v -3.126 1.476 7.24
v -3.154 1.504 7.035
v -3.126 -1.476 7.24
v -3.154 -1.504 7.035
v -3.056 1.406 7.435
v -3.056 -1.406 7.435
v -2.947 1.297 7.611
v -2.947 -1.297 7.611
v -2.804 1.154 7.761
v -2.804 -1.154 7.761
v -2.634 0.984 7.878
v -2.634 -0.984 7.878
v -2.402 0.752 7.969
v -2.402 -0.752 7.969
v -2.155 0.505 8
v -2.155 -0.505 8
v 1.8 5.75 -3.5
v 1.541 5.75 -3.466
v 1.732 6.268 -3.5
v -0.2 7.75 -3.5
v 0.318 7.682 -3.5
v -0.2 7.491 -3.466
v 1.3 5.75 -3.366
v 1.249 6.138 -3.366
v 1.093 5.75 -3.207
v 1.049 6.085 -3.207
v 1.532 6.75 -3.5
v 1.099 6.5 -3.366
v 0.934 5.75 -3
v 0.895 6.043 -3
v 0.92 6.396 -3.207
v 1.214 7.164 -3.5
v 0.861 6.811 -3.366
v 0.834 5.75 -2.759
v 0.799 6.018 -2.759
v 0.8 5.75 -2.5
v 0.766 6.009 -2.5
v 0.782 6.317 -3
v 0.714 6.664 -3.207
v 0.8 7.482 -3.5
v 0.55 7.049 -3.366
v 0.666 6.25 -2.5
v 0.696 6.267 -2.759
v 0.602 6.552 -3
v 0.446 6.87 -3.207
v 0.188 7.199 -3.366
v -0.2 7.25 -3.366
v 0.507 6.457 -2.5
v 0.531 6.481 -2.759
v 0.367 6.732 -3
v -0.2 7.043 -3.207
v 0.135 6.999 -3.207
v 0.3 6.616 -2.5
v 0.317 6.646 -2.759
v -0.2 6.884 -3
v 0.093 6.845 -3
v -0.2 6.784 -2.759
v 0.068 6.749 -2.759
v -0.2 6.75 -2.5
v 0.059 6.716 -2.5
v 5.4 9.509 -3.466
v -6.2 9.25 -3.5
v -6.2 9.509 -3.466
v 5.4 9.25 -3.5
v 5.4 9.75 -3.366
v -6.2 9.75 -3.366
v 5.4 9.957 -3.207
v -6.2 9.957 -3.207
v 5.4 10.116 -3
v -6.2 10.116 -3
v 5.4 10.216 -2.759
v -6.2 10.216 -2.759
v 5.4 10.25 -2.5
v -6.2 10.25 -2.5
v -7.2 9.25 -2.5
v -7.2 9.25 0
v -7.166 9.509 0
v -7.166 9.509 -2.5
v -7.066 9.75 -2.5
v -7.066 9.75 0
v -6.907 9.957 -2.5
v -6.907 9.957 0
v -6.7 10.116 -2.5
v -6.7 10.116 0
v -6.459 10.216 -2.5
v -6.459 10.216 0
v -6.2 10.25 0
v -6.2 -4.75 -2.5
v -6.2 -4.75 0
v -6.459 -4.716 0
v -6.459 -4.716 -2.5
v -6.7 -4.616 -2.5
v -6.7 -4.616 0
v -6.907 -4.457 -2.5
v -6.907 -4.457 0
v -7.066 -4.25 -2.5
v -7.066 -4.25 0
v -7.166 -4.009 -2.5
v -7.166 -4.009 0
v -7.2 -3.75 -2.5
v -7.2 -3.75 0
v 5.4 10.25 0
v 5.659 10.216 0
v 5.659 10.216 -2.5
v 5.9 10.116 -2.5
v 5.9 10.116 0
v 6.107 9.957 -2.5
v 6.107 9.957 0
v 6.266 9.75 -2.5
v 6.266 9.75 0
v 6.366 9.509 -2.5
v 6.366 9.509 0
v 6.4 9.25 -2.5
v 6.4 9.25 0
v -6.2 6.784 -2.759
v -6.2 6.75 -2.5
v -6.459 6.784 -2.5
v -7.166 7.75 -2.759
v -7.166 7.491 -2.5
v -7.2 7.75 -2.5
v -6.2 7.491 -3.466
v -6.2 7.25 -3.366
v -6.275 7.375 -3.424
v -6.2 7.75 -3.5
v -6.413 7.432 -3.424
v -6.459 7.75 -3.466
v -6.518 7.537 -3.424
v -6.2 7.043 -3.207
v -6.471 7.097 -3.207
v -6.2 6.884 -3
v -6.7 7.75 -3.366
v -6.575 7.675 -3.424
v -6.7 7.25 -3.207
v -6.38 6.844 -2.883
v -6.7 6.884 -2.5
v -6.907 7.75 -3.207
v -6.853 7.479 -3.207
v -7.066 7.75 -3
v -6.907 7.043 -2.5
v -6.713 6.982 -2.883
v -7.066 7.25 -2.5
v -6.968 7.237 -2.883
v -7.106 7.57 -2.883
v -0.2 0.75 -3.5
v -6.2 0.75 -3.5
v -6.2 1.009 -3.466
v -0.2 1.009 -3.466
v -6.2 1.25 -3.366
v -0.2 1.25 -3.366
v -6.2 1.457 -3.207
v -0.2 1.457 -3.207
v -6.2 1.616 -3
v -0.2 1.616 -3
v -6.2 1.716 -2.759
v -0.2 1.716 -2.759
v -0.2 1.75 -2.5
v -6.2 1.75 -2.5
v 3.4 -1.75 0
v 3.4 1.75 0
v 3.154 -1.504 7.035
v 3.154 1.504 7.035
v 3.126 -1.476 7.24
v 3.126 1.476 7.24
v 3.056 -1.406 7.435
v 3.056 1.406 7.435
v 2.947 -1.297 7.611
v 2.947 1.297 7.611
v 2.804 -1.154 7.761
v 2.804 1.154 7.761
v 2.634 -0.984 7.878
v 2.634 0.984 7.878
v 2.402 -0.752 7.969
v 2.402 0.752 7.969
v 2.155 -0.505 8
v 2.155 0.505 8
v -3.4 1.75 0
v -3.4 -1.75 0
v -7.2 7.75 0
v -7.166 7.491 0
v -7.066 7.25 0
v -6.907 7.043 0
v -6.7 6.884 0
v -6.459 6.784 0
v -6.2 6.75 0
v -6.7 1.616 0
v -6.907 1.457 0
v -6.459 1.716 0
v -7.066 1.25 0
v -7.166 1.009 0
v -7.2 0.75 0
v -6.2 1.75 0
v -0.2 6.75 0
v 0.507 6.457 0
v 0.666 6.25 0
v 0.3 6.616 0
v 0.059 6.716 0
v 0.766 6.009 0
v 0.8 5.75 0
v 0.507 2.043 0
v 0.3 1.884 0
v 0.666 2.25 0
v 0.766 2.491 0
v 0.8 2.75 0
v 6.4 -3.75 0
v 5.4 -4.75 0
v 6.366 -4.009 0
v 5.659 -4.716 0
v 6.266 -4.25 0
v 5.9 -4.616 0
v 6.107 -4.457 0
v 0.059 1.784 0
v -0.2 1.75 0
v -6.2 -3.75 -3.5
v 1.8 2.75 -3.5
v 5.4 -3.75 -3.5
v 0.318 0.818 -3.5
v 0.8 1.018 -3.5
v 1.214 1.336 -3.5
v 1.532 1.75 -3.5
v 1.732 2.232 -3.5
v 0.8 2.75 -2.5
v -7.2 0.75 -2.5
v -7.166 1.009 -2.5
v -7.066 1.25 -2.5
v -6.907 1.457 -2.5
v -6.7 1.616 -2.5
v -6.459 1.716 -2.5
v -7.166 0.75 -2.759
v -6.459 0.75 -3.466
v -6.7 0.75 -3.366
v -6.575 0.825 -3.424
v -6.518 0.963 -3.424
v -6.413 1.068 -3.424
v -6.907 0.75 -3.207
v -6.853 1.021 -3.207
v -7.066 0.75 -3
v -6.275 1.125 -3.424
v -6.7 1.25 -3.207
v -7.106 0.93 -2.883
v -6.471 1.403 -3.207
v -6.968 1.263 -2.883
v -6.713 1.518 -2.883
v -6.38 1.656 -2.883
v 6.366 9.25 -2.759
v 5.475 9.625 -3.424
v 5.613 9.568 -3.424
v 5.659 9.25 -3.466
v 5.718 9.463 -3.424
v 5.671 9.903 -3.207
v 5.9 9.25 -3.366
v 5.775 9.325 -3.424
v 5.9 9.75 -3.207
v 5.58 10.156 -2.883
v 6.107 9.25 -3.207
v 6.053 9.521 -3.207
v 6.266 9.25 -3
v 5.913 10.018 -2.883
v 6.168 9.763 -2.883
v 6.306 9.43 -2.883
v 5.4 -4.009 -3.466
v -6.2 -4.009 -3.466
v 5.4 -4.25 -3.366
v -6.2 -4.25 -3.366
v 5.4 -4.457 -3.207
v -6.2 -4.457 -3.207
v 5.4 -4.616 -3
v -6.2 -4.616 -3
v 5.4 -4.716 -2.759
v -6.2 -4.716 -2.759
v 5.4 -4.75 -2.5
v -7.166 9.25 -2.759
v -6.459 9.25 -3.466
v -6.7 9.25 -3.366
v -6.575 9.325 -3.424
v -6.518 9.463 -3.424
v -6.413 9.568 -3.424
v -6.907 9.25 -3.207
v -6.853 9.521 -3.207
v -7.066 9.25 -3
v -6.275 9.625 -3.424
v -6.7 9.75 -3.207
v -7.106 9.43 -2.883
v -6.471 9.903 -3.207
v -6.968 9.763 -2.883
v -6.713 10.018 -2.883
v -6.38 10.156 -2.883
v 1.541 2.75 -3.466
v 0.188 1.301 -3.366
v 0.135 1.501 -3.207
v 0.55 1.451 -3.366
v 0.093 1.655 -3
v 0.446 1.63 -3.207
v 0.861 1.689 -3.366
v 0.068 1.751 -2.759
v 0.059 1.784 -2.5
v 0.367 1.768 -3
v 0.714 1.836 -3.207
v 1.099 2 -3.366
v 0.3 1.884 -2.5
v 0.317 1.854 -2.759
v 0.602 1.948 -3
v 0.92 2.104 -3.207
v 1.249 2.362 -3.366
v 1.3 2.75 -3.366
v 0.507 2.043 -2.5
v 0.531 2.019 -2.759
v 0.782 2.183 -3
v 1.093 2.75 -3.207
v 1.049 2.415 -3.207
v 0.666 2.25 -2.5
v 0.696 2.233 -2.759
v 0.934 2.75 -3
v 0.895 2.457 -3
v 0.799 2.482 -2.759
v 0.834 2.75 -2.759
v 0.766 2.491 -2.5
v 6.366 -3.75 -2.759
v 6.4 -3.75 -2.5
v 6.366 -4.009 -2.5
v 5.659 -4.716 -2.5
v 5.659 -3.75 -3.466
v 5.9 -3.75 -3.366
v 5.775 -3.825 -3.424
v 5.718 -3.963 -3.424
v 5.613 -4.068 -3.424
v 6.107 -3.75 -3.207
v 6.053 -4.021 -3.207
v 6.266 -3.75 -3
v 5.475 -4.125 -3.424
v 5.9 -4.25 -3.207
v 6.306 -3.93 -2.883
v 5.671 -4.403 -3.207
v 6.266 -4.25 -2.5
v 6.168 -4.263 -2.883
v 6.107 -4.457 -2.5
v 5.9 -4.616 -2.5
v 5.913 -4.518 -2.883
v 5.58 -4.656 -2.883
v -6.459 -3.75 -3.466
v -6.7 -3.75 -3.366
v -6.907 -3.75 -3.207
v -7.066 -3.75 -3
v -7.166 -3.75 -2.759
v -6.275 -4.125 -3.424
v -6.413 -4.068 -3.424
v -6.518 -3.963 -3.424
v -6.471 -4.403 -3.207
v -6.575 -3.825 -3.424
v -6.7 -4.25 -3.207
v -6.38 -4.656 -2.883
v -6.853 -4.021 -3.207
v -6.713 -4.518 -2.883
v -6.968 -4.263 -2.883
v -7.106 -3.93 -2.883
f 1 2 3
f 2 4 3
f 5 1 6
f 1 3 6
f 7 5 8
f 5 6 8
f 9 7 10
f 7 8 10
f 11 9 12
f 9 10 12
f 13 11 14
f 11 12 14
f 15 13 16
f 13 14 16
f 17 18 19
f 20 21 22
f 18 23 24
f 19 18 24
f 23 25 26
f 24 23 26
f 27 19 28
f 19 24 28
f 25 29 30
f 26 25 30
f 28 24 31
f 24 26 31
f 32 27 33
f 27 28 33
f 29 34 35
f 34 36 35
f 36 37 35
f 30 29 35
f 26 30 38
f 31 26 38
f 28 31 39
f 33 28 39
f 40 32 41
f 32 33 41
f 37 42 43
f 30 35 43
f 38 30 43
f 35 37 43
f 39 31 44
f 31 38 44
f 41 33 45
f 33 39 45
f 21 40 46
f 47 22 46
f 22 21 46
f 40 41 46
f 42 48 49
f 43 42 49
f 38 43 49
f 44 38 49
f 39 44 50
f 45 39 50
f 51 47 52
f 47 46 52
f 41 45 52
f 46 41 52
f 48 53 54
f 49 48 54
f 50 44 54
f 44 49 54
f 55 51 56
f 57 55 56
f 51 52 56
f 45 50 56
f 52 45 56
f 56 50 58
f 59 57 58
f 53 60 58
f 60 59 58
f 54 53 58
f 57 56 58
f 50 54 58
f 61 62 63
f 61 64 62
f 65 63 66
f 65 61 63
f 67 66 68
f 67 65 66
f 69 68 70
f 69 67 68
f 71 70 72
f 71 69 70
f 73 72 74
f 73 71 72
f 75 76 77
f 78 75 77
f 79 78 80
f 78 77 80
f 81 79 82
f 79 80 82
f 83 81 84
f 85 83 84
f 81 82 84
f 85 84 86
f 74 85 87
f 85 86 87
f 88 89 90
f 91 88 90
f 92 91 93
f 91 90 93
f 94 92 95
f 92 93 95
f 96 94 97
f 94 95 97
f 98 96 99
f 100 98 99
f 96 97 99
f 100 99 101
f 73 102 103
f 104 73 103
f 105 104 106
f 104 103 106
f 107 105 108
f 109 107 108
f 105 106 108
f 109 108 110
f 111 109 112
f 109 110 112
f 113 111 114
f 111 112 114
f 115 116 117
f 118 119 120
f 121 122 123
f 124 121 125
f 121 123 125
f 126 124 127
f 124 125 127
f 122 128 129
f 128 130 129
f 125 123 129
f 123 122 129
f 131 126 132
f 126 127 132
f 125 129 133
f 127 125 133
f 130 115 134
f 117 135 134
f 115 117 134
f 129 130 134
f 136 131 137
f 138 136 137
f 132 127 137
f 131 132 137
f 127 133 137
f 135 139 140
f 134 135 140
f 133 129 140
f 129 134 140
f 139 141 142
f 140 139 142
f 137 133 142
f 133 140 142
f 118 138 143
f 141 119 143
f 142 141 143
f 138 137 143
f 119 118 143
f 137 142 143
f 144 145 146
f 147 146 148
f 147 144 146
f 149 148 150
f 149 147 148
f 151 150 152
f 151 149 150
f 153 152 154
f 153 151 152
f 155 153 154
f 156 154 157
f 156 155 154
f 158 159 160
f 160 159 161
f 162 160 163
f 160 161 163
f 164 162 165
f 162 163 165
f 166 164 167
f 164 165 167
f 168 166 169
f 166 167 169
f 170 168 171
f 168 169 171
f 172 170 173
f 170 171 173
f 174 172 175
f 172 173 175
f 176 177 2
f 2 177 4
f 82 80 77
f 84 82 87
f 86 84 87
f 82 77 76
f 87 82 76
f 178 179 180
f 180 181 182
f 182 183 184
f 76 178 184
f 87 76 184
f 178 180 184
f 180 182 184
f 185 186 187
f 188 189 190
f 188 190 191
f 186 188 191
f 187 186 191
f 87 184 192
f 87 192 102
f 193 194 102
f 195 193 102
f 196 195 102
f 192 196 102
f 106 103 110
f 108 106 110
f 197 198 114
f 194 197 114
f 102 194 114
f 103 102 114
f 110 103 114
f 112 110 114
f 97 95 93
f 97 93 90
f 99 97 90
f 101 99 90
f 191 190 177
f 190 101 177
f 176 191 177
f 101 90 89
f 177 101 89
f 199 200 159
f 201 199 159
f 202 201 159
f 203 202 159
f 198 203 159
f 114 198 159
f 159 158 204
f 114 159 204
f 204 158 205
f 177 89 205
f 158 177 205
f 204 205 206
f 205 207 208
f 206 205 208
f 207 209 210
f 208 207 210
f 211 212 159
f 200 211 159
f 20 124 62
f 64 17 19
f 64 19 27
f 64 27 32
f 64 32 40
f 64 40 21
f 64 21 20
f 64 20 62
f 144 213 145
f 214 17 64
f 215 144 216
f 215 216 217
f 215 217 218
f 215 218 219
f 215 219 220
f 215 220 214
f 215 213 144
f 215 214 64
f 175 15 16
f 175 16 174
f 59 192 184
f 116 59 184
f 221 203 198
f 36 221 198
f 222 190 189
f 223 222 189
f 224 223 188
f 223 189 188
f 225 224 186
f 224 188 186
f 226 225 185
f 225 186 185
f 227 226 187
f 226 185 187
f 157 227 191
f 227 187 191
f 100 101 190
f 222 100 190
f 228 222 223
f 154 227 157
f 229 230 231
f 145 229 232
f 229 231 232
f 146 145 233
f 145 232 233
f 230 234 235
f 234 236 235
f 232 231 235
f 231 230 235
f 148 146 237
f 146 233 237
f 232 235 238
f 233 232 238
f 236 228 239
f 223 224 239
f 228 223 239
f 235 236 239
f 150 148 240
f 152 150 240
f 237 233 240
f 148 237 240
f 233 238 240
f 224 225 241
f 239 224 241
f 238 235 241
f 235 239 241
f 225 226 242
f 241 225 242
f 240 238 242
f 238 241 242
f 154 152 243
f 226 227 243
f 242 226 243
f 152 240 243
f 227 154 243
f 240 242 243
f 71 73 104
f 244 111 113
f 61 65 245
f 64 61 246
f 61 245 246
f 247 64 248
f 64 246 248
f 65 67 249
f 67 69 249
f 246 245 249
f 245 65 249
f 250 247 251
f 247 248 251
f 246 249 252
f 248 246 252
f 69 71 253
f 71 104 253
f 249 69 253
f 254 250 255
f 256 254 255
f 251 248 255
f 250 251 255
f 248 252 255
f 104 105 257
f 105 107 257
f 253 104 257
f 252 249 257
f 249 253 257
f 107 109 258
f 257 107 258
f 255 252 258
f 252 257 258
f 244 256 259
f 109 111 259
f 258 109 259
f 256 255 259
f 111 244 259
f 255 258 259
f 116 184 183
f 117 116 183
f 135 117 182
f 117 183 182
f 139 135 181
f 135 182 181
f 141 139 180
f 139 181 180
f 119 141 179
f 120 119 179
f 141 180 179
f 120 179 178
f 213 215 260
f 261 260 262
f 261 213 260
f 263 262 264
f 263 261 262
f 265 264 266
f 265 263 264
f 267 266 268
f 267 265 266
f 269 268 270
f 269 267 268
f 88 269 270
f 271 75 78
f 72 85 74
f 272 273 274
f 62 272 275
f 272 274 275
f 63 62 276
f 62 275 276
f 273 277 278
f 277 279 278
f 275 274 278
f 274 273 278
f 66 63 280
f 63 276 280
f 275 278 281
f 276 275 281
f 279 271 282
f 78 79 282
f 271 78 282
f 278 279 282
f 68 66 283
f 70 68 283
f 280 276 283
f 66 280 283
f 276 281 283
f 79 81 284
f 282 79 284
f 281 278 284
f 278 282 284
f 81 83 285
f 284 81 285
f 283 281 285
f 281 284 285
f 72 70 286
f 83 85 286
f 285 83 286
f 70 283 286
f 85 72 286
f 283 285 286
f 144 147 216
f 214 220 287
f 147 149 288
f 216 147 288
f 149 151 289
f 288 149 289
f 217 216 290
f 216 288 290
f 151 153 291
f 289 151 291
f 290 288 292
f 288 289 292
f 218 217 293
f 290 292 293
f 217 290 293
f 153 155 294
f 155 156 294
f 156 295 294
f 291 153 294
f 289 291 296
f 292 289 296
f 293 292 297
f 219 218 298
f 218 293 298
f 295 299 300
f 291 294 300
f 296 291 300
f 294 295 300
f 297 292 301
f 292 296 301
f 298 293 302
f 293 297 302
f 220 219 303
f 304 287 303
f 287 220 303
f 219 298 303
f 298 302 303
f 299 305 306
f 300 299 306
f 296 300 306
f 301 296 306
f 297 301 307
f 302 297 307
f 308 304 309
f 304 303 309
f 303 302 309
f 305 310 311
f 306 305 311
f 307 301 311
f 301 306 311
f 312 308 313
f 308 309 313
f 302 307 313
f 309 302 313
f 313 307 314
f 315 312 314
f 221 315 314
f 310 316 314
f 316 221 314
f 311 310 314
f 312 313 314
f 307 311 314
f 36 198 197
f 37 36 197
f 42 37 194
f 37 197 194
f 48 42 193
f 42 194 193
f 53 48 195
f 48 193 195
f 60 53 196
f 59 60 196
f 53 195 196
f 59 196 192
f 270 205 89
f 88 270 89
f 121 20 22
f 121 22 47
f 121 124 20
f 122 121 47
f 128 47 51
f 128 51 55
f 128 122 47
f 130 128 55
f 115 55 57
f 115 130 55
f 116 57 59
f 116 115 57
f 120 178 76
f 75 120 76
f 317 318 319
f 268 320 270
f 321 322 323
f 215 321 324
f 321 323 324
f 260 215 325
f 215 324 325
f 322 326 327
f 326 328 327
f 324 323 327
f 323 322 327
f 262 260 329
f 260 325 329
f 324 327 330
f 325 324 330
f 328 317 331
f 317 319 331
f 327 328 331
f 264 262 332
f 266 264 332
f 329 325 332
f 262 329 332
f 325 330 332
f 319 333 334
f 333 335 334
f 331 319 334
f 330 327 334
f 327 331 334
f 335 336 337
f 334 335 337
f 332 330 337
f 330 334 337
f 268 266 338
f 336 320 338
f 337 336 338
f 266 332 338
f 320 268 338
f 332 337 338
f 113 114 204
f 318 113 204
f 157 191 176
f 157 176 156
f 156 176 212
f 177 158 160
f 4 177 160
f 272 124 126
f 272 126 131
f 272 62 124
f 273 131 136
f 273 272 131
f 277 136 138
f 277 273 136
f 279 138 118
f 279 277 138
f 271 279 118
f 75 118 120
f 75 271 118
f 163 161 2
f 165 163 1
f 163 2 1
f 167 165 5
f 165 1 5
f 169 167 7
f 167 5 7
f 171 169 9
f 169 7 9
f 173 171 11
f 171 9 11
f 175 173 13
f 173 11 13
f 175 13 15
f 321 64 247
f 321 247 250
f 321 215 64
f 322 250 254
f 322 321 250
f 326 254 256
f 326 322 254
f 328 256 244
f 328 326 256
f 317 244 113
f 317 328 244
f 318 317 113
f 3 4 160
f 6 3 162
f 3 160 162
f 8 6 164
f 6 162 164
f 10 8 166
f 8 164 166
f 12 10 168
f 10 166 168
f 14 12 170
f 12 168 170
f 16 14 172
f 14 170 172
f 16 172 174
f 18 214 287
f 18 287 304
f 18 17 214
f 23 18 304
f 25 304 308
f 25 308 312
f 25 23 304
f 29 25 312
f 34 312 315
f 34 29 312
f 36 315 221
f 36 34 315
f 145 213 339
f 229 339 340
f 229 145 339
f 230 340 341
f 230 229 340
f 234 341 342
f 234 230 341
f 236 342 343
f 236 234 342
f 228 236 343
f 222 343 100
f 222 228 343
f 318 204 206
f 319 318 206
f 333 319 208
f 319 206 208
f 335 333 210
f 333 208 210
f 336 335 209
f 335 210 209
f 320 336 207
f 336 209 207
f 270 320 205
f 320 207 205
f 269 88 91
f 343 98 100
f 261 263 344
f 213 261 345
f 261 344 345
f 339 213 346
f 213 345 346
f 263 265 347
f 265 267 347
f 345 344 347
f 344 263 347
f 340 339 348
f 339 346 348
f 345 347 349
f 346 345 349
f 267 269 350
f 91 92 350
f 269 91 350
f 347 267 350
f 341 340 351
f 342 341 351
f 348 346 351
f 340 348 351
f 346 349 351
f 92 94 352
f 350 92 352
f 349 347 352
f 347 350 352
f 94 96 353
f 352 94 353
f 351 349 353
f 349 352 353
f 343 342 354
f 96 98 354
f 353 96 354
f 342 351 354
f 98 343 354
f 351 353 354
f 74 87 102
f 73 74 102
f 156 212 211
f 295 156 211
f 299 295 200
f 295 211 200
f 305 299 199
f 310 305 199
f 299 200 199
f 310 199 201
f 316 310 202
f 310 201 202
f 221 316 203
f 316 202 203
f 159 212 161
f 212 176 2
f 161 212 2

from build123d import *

# Parameters (mm, degrees)
F0_W     = 6.8
F0_H     = 3.5
F1_DEPTH = 8
F1_TAPER = 2
F3_DEPTH = 3.5
F4_R     = 1


with BuildPart() as f1:
    # F0 (on Top) → F1 (new body)
    with BuildSketch(Plane.XY):
        Rectangle(F0_W, F0_H)
    extrude(amount=F1_DEPTH, taper=F1_TAPER)

    # F2 (on face) → F3 (join)
    with BuildSketch(Plane(origin=(0, 0, 0), x_dir=(1, 0, 0), z_dir=(0, 0, -1))):
        with BuildLine():
            Line((3.4, -1.75), (-0.2, -1.75))
            ThreePointArc((-0.2, -1.75), (0.5071067812, -2.0428932188), (0.8, -2.75))
            Line((0.8, -2.75), (0.8, -5.75))
            ThreePointArc((0.8, -5.75), (0.5071067812, -6.4571067812), (-0.2, -6.75))
            Line((-0.2, -6.75), (-3.4, -6.75))
            Line((-3.4, -6.75), (-6.2, -6.75))
            ThreePointArc((-6.2, -6.75), (-6.9071067812, -7.0428932188), (-7.2, -7.75))
            Line((-7.2, -7.75), (-7.2, -9.25))
            ThreePointArc((-7.2, -9.25), (-6.9071067812, -9.9571067812), (-6.2, -10.25))
            Line((-6.2, -10.25), (-3.6740736105, -10.25))
            Line((-3.6740736105, -10.25), (-3.4, -10.25))
            Line((-3.4, -10.25), (5.4, -10.25))
            ThreePointArc((5.4, -10.25), (6.1071067812, -9.9571067812), (6.4, -9.25))
            Line((6.4, -9.25), (6.4, -4.75))
            Line((6.4, -4.75), (6.4, 3.75))
            ThreePointArc((6.4, 3.75), (6.1071067812, 4.4571067812), (5.4, 4.75))
            Line((5.4, 4.75), (-3.4, 4.75))
            Line((-3.4, 4.75), (-6.2, 4.75))
            ThreePointArc((-6.2, 4.75), (-6.9071067812, 4.4571067812), (-7.2, 3.75))
            Line((-7.2, 3.75), (-7.2, -0.75))
            ThreePointArc((-7.2, -0.75), (-6.9071067812, -1.4571067812), (-6.2, -1.75))
            Line((-6.2, -1.75), (-3.4, -1.75))
            Line((-3.4, -1.75), (-3.4, 1.75))
            Line((-3.4, 1.75), (3.4, 1.75))
            Line((3.4, 1.75), (3.4, -1.75))
        make_face()
        Polygon((-3.4, -1.75), (-0.2, -1.75), (3.4, -1.75), (3.4, 1.75), (-3.4, 1.75), align=None)
    extrude(amount=F3_DEPTH)

    # F4
    f4_edges = [f1.edges().sort_by_distance(p)[0] for p in [
        (-0.4, 10.25, -3.5),
        (0, 1.470634, 8),
        (0, -1.470634, 8),
        (-3.120634, 0, 8),
        (3.120634, 0, 8),
    ]]
    fillet(f4_edges, radius=F4_R)


solid = f1.part
